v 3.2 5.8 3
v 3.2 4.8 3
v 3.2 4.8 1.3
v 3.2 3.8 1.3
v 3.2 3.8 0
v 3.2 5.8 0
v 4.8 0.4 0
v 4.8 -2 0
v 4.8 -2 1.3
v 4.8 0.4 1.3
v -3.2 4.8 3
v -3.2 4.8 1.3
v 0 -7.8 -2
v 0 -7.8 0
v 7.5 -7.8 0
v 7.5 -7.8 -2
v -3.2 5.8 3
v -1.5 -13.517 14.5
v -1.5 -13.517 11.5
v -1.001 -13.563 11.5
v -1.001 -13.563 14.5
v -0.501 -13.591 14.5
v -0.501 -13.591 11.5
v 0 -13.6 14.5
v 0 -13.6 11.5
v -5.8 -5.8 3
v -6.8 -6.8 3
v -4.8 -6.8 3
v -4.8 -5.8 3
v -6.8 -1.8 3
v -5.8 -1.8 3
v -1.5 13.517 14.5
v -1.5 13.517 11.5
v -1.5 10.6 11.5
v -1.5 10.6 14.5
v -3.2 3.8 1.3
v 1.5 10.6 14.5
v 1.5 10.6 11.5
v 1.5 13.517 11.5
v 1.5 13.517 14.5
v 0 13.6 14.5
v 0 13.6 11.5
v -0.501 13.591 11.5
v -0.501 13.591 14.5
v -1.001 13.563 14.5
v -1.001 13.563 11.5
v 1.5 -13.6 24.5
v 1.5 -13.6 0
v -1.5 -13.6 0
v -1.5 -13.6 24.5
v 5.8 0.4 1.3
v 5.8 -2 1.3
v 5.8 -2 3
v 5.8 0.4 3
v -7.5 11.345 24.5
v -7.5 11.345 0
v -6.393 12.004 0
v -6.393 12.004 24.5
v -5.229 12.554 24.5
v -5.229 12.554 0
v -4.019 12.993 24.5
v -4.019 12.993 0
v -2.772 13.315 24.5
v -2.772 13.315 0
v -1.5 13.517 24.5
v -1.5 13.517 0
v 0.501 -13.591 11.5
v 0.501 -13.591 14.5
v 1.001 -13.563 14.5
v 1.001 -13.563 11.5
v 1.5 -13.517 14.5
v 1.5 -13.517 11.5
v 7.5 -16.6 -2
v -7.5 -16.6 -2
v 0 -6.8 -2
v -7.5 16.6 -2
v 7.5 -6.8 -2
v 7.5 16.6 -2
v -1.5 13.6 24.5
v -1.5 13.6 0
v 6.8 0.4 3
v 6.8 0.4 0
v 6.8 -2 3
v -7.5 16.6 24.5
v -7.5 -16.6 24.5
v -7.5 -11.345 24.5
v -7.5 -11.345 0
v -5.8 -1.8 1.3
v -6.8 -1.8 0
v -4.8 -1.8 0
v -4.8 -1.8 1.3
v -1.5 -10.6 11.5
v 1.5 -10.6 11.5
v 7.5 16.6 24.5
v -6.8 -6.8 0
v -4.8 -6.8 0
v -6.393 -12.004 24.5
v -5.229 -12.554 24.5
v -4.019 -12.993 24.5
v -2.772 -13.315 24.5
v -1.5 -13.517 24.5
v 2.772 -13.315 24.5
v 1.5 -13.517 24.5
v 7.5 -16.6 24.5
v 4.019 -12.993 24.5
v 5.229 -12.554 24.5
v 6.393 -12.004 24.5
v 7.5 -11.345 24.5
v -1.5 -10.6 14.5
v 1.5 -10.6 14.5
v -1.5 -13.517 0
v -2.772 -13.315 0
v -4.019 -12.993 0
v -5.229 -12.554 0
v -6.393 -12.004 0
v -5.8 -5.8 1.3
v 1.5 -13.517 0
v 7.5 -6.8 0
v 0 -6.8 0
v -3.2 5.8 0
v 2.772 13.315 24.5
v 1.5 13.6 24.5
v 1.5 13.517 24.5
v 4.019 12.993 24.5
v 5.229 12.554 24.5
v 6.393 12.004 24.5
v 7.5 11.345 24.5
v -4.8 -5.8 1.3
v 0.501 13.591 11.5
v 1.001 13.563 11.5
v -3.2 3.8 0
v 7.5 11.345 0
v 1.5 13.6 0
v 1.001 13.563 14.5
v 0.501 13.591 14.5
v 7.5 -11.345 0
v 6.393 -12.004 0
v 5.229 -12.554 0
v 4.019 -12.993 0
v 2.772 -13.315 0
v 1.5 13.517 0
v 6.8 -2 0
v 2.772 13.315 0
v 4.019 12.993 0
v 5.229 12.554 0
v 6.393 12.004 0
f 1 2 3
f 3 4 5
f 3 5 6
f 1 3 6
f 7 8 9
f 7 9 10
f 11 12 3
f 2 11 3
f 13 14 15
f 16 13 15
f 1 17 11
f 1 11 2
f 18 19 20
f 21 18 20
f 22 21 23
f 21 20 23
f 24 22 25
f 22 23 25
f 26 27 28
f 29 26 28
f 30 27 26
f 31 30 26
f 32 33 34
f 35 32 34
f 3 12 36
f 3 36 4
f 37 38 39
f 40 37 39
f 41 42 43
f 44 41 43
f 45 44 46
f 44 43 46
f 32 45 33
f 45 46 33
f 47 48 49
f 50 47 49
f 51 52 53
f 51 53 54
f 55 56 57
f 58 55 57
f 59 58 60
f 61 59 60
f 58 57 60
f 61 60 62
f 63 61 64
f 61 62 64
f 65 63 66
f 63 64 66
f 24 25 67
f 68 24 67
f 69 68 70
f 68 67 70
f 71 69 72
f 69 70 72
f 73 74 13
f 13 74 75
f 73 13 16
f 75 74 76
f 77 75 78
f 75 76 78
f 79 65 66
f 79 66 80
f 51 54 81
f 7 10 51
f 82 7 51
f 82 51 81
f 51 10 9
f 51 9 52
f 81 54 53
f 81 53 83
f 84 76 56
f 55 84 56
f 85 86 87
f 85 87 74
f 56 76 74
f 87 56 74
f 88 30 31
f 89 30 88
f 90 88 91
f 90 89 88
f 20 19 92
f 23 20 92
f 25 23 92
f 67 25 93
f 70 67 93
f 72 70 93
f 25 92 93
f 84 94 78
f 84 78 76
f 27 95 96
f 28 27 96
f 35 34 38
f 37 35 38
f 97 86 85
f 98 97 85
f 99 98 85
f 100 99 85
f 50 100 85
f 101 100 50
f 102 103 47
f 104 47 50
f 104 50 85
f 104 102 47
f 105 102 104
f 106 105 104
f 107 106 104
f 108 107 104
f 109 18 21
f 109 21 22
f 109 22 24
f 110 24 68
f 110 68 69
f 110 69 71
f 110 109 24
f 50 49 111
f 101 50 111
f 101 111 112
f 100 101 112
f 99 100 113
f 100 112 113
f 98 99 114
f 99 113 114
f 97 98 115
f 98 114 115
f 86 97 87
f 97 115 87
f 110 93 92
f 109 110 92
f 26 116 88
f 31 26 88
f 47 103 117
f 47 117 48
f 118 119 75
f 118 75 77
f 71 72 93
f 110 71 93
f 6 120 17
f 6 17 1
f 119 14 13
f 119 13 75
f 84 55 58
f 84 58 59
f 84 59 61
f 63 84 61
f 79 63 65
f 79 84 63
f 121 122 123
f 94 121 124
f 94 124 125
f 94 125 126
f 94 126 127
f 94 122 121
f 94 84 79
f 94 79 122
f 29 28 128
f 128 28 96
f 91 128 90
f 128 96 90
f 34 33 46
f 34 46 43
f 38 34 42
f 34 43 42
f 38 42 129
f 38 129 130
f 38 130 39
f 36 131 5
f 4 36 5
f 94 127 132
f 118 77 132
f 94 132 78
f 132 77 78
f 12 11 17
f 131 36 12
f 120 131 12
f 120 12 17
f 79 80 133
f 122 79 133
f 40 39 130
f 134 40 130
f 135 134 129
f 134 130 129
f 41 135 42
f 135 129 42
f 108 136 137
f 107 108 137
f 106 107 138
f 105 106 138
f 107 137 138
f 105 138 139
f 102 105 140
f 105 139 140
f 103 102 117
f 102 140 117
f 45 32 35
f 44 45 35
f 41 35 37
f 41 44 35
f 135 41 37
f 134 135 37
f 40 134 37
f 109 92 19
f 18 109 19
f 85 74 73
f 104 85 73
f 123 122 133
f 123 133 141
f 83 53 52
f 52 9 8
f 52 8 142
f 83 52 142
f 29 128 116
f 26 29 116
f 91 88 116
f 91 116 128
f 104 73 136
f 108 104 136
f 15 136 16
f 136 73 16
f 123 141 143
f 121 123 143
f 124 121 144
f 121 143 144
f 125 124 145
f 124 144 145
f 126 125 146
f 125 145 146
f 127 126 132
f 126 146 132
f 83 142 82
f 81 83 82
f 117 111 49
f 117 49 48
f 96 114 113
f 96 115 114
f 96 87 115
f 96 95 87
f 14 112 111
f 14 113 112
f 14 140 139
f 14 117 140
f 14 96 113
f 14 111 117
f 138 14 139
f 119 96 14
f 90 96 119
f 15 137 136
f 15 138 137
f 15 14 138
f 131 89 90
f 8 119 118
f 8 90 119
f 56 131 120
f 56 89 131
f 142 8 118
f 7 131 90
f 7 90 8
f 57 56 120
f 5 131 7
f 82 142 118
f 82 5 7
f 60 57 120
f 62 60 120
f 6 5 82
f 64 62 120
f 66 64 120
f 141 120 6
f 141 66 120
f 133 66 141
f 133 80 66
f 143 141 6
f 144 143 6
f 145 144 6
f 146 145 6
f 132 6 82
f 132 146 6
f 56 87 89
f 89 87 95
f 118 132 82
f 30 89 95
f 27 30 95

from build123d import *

# Parameters (mm, degrees)
BOSS_EXTRUDE1_DEPTH   = 14.5
BOSS_EXTRUDE1_2_DEPTH = 14.5
BOSS_EXTRUDE1_3_DEPTH = 14.5
BOSS_EXTRUDE1_4_DEPTH = 14.5
SKETCH1_3_W           = 15
SKETCH1_3_H           = 33.2
BOSS_EXTRUDE3_DEPTH   = 2
CUT_EXTRUDE1_DEPTH    = 11.5
BOSS_EXTRUDE4_DEPTH   = 24.5
SKETCH2_W             = 1
SKETCH2_H             = 4
SKETCH2_W_2           = 6.4
SKETCH2_H_2           = 1
SKETCH2_H_3           = 2.4
BOSS_EXTRUDE5_DEPTH   = 1.3
SKETCH2_3_W           = 6.4
SKETCH2_3_H           = 1
SKETCH2_3_W_2         = 1
SKETCH2_3_H_2         = 2.4
BOSS_EXTRUDE6_DEPTH   = 3
SKETCH2_4_W           = 7.5
SKETCH2_4_H           = 1
CUT_EXTRUDE2_DEPTH    = 31.529657712


with BuildPart() as part:
    # Sketch1 → Boss-Extrude1 (new body)
    with BuildSketch(Plane.XY):
        with BuildLine():
            Line((7.5, 16.6), (-7.5, 16.6))
            Line((-7.5, 16.6), (-7.5, 11.34504297))
            ThreePointArc((-7.5, 11.34504297), (-4.629187607, 12.787909215), (-1.5, 13.5170263))
            Line((-1.5, 13.5170263), (-1.5, 13.6))
            Line((-1.5, 13.6), (0, 13.6))
            Line((0, 13.6), (1.5, 13.6))
            Line((1.5, 13.6), (1.5, 13.5170263))
            ThreePointArc((1.5, 13.5170263), (4.629187607, 12.787909215), (7.5, 11.34504297))
            Line((7.5, 11.34504297), (7.5, 16.6))
        make_face()
    extrude(amount=BOSS_EXTRUDE1_DEPTH)



with BuildPart() as body_2:
    # Sketch1 → Boss-Extrude1 2 (new body)
    with BuildSketch(Plane.XY):
        with BuildLine():
            ThreePointArc((0, 13.6), (-0.751146563, 13.579240731), (-1.5, 13.5170263))
            Line((-1.5, 13.5170263), (-1.5, 10.6))
            Line((-1.5, 10.6), (1.5, 10.6))
            Line((1.5, 10.6), (1.5, 13.5170263))
            ThreePointArc((1.5, 13.5170263), (0.751146563, 13.579240731), (0, 13.6))
        make_face()
    extrude(amount=BOSS_EXTRUDE1_2_DEPTH)


with BuildPart() as body_3:
    # Sketch1 → Boss-Extrude1 3 (new body)
    with BuildSketch(Plane.XY):
        with BuildLine():
            Line((-1.5, -10.6), (-1.5, -13.5170263))
            ThreePointArc((-1.5, -13.5170263), (-0.751146563, -13.579240731), (0, -13.6))
            ThreePointArc((0, -13.6), (0.751146563, -13.579240731), (1.5, -13.5170263))
            Line((1.5, -13.5170263), (1.5, -10.6))
            Line((1.5, -10.6), (-1.5, -10.6))
        make_face()
    extrude(amount=BOSS_EXTRUDE1_3_DEPTH)


with BuildPart() as body_4:
    # Sketch1 → Boss-Extrude1 4 (new body)
    with BuildSketch(Plane.XY):
        with BuildLine():
            ThreePointArc((-1.5, -13.5170263), (-4.629187607, -12.787909215), (-7.5, -11.34504297))
            Line((-7.5, -11.34504297), (-7.5, -16.6))
            Line((-7.5, -16.6), (7.5, -16.6))
            Line((7.5, -16.6), (7.5, -11.34504297))
            ThreePointArc((7.5, -11.34504297), (4.629187607, -12.787909215), (1.5, -13.5170263))
            Line((1.5, -13.5170263), (1.5, -13.6))
            Line((1.5, -13.6), (0, -13.6))
            Line((0, -13.6), (-1.5, -13.6))
            Line((-1.5, -13.6), (-1.5, -13.5170263))
        make_face()
    extrude(amount=BOSS_EXTRUDE1_4_DEPTH)


with BuildPart() as part_1:
    add(part.part)

    add(body_4.part)  # Boss-Extrude3 merges body 4
    # Sketch1<3> → Boss-Extrude3 (add)
    with BuildSketch(Plane.XY):
        Rectangle(SKETCH1_3_W, SKETCH1_3_H)
    extrude(amount=-BOSS_EXTRUDE3_DEPTH)

    # Sketch1<5> → Boss-Extrude4 (add)
    with BuildSketch(Plane.XY):
        with BuildLine():
            Line((7.5, 16.6), (-7.5, 16.6))
            Line((-7.5, 16.6), (-7.5, 11.34504297))
            ThreePointArc((-7.5, 11.34504297), (-4.629187607, 12.787909215), (-1.5, 13.5170263))
            Line((-1.5, 13.5170263), (-1.5, 13.6))
            Line((-1.5, 13.6), (0, 13.6))
            Line((0, 13.6), (1.5, 13.6))
            Line((1.5, 13.6), (1.5, 13.5170263))
            ThreePointArc((1.5, 13.5170263), (4.629187607, 12.787909215), (7.5, 11.34504297))
            Line((7.5, 11.34504297), (7.5, 16.6))
        make_face()
        with BuildLine():
            ThreePointArc((-1.5, -13.5170263), (-4.629187607, -12.787909215), (-7.5, -11.34504297))
            Line((-7.5, -11.34504297), (-7.5, -16.6))
            Line((-7.5, -16.6), (7.5, -16.6))
            Line((7.5, -16.6), (7.5, -11.34504297))
            ThreePointArc((7.5, -11.34504297), (4.629187607, -12.787909215), (1.5, -13.5170263))
            Line((1.5, -13.5170263), (1.5, -13.6))
            Line((1.5, -13.6), (0, -13.6))
            Line((0, -13.6), (-1.5, -13.6))
            Line((-1.5, -13.6), (-1.5, -13.5170263))
        make_face()
    extrude(amount=BOSS_EXTRUDE4_DEPTH)

    # Sketch2 → Boss-Extrude5 (add)
    with BuildSketch(Plane.XY):
        with Locations((-5.3, -3.8)):
            Rectangle(SKETCH2_W, SKETCH2_H)
        with Locations((0, 4.3)):
            Rectangle(SKETCH2_W_2, SKETCH2_H_2)
        with Locations((5.3, -0.8)):
            Rectangle(SKETCH2_W, SKETCH2_H_3)
    extrude(amount=BOSS_EXTRUDE5_DEPTH)

    # Sketch2<3> → Boss-Extrude6 (add)
    with BuildSketch(Plane.XY):
        with Locations((0, 5.3)):
            Rectangle(SKETCH2_3_W, SKETCH2_3_H)
        Polygon((-5.8, -1.8), (-6.8, -1.8), (-6.8, -6.8), (-4.8, -6.8), (-4.8, -5.8), (-5.8, -5.8), align=None)
        with Locations((6.3, -0.8)):
            Rectangle(SKETCH2_3_W_2, SKETCH2_3_H_2)
    extrude(amount=BOSS_EXTRUDE6_DEPTH)

    # Sketch2<4> → Cut-Extrude2 (cut, through all)
    with BuildSketch(Plane.XY):
        with Locations((3.75, -7.3)):
            Rectangle(SKETCH2_4_W, SKETCH2_4_H)
    extrude(amount=-CUT_EXTRUDE2_DEPTH, mode=Mode.SUBTRACT)


with BuildPart() as cut_extrude1_tool:
    # Sketch1<4> → Cut-Extrude1 (new body)
    with BuildSketch(Plane.XY):
        with BuildLine():
            Line((-1.5, -10.6), (-1.5, -13.5170263))
            ThreePointArc((-1.5, -13.5170263), (-0.751146563, -13.579240731), (0, -13.6))
            ThreePointArc((0, -13.6), (0.751146563, -13.579240731), (1.5, -13.5170263))
            Line((1.5, -13.5170263), (1.5, -10.6))
            Line((1.5, -10.6), (-1.5, -10.6))
        make_face()
        with BuildLine():
            ThreePointArc((0, 13.6), (-0.751146563, 13.579240731), (-1.5, 13.5170263))
            Line((-1.5, 13.5170263), (-1.5, 10.6))
            Line((-1.5, 10.6), (1.5, 10.6))
            Line((1.5, 10.6), (1.5, 13.5170263))
            ThreePointArc((1.5, 13.5170263), (0.751146563, 13.579240731), (0, 13.6))
        make_face()
    extrude(amount=CUT_EXTRUDE1_DEPTH)


with BuildPart() as body_2_1:
    add(body_2.part)

    # Cut-Extrude1: cut by cut_extrude1_tool
    add(cut_extrude1_tool.part, mode=Mode.SUBTRACT)


with BuildPart() as body_3_1:
    add(body_3.part)

    # Cut-Extrude1: cut by cut_extrude1_tool
    add(cut_extrude1_tool.part, mode=Mode.SUBTRACT)


solid = Compound([part_1.part, body_2_1.part, body_3_1.part])
